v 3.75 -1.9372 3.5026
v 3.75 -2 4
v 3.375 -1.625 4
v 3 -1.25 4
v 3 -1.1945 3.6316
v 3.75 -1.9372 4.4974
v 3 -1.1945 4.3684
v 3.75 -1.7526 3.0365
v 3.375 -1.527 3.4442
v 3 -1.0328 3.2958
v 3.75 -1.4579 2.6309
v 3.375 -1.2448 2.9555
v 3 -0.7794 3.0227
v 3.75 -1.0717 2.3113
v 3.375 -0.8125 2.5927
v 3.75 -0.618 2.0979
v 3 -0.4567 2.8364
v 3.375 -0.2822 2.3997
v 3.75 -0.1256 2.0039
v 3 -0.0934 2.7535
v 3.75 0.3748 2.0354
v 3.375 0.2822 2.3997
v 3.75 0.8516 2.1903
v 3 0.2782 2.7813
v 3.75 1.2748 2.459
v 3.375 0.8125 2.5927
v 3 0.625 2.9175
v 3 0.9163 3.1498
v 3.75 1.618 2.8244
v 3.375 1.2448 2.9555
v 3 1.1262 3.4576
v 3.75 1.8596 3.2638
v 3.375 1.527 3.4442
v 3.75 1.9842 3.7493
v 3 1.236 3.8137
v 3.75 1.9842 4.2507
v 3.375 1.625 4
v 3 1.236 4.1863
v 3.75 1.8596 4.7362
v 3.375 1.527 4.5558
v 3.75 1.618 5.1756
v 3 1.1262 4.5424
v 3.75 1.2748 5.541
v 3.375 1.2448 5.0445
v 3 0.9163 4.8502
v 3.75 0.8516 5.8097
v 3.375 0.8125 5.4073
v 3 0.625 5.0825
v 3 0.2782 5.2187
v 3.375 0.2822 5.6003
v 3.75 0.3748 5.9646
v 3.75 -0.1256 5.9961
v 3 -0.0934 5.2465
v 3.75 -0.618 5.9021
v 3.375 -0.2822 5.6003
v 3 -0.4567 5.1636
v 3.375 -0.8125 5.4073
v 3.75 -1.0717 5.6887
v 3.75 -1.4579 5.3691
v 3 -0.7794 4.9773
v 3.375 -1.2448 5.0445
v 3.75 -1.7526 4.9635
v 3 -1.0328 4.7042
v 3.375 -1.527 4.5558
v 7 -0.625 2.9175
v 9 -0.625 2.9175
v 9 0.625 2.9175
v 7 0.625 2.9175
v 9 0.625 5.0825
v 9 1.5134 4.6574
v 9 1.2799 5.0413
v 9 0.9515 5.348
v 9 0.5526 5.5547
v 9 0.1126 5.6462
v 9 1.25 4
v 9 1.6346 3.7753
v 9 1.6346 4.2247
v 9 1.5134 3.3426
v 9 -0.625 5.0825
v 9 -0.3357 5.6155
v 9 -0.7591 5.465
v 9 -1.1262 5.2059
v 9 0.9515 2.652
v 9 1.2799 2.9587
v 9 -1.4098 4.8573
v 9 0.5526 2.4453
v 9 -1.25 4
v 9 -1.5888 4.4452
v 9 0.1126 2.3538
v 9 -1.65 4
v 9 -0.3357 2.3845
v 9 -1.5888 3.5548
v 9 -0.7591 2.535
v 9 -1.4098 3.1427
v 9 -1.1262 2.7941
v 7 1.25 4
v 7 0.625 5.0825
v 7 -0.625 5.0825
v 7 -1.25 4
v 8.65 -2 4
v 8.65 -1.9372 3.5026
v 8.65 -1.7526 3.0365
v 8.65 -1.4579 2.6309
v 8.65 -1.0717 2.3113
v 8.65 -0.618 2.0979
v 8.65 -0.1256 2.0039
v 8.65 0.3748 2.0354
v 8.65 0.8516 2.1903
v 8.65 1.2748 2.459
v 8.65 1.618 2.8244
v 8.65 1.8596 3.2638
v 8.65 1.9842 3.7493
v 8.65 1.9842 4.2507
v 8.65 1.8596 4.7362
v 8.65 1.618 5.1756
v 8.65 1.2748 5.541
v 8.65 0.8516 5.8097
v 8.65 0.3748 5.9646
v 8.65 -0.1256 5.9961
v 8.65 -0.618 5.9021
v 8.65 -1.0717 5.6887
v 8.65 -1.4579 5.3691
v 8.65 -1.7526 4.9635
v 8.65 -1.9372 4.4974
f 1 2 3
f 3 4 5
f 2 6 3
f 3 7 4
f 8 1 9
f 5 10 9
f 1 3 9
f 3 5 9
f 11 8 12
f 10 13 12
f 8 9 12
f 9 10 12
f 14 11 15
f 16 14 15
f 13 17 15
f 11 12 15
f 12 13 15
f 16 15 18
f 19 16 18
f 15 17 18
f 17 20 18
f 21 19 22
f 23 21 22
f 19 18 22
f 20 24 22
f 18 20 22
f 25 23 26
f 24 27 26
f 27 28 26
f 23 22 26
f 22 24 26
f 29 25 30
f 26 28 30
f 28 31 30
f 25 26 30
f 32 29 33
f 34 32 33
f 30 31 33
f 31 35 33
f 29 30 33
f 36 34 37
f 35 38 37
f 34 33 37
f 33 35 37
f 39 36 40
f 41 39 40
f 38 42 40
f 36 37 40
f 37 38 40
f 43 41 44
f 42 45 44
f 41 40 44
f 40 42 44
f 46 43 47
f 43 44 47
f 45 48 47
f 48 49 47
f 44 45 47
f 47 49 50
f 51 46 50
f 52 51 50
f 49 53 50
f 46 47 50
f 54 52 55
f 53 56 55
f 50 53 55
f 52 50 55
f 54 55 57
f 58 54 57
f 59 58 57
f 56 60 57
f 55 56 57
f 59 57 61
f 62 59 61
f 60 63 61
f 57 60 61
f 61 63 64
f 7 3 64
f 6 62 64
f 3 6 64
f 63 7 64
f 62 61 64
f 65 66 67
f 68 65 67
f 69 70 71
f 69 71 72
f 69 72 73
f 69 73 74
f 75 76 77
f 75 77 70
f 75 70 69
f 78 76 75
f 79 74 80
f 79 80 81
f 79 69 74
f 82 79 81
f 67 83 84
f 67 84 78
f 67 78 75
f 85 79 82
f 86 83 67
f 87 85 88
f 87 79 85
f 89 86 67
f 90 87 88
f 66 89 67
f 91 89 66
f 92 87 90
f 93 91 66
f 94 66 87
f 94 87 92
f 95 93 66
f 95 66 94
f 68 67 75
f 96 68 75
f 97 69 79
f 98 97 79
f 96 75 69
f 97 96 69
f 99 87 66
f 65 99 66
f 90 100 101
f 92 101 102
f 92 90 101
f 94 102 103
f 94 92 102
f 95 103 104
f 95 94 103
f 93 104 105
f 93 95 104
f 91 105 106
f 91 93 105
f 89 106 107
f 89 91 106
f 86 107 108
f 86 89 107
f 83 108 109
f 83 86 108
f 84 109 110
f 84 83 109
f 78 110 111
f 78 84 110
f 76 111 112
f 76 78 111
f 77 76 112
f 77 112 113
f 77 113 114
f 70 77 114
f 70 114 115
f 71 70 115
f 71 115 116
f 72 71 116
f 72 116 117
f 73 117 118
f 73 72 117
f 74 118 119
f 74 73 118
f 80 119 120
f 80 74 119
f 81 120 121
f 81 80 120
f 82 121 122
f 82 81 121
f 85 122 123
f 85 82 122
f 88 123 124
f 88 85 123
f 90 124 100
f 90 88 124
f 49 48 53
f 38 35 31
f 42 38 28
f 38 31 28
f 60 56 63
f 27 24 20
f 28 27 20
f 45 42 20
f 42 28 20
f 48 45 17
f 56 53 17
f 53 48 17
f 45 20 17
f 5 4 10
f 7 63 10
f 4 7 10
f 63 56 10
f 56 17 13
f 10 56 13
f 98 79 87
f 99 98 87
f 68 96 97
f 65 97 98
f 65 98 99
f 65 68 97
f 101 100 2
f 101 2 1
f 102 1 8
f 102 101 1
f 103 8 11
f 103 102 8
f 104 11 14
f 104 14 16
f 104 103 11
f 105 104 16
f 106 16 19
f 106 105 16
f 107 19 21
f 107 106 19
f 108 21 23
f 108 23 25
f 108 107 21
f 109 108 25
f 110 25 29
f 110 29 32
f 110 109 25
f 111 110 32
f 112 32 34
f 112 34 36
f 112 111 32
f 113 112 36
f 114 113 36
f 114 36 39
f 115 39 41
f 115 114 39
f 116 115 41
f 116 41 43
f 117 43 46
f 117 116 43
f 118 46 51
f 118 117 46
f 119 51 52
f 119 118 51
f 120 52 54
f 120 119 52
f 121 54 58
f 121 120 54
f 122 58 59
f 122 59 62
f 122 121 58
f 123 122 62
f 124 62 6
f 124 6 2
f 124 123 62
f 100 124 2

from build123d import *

# Parameters (mm, degrees)
SKETCH119_W             = 2
SKETCH119_H             = 6
POCKET017_DEPTH         = 2
CHAMFER006_SIZE         = 0.35
CHAMFER007_SIZE         = 0.75
BODY020_PLACEMENT_ANGLE = 90
BODY019_PLACEMENT_ANGLE = 90


with BuildPart() as part:
    # Sketch119 → Revolution002 (revolve)
    with BuildSketch(Plane.XZ):
        with Locations((-1, 3)):
            Rectangle(SKETCH119_W, SKETCH119_H)
    revolve(axis=Axis((0, 0, 0), (0, 0, 1)))

    # Sketch124 (on Face3 of Revolution002) → Pocket017 (cut)
    with BuildSketch(Plane(origin=(0, 0, 6), x_dir=(-1, 0, 0), z_dir=(0, 0, 1))):
        Polygon((-0.625, -1.0825317547), (0.625, -1.0825317547), (1.25, 0), (0.625, 1.0825317547), (-0.625, 1.0825317547), (-1.25, 0), align=None)
    extrude(amount=-POCKET017_DEPTH, mode=Mode.SUBTRACT)

    # Chamfer006
    chamfer006_edges = [part.edges().sort_by_distance(p)[0] for p in [
        (2, 0, 6),
    ]]
    chamfer(chamfer006_edges, length=CHAMFER006_SIZE)

    # Chamfer007
    chamfer007_edges = [part.edges().sort_by_distance(p)[0] for p in [
        (2, 0, 0),
    ]]
    chamfer(chamfer007_edges, length=CHAMFER007_SIZE)


with BuildPart() as part_1:
    # Body020 placement: moved
    add(part.part.moved(Location((0, -3, 4))).rotate(Axis((0, -3, 4), (1, 0, 0)), BODY020_PLACEMENT_ANGLE))


with BuildPart() as part_2:
    # Clone002 placement: moved
    add(part_1.part.moved(Location((0, -1, 0))))


with BuildPart() as part_3:
    # Body019 placement: moved
    add(part_2.part.moved(Location((-1, 0, 0))).rotate(Axis((-1, 0, 0), (0, 0, 1)), BODY019_PLACEMENT_ANGLE))


solid = part_3.part
